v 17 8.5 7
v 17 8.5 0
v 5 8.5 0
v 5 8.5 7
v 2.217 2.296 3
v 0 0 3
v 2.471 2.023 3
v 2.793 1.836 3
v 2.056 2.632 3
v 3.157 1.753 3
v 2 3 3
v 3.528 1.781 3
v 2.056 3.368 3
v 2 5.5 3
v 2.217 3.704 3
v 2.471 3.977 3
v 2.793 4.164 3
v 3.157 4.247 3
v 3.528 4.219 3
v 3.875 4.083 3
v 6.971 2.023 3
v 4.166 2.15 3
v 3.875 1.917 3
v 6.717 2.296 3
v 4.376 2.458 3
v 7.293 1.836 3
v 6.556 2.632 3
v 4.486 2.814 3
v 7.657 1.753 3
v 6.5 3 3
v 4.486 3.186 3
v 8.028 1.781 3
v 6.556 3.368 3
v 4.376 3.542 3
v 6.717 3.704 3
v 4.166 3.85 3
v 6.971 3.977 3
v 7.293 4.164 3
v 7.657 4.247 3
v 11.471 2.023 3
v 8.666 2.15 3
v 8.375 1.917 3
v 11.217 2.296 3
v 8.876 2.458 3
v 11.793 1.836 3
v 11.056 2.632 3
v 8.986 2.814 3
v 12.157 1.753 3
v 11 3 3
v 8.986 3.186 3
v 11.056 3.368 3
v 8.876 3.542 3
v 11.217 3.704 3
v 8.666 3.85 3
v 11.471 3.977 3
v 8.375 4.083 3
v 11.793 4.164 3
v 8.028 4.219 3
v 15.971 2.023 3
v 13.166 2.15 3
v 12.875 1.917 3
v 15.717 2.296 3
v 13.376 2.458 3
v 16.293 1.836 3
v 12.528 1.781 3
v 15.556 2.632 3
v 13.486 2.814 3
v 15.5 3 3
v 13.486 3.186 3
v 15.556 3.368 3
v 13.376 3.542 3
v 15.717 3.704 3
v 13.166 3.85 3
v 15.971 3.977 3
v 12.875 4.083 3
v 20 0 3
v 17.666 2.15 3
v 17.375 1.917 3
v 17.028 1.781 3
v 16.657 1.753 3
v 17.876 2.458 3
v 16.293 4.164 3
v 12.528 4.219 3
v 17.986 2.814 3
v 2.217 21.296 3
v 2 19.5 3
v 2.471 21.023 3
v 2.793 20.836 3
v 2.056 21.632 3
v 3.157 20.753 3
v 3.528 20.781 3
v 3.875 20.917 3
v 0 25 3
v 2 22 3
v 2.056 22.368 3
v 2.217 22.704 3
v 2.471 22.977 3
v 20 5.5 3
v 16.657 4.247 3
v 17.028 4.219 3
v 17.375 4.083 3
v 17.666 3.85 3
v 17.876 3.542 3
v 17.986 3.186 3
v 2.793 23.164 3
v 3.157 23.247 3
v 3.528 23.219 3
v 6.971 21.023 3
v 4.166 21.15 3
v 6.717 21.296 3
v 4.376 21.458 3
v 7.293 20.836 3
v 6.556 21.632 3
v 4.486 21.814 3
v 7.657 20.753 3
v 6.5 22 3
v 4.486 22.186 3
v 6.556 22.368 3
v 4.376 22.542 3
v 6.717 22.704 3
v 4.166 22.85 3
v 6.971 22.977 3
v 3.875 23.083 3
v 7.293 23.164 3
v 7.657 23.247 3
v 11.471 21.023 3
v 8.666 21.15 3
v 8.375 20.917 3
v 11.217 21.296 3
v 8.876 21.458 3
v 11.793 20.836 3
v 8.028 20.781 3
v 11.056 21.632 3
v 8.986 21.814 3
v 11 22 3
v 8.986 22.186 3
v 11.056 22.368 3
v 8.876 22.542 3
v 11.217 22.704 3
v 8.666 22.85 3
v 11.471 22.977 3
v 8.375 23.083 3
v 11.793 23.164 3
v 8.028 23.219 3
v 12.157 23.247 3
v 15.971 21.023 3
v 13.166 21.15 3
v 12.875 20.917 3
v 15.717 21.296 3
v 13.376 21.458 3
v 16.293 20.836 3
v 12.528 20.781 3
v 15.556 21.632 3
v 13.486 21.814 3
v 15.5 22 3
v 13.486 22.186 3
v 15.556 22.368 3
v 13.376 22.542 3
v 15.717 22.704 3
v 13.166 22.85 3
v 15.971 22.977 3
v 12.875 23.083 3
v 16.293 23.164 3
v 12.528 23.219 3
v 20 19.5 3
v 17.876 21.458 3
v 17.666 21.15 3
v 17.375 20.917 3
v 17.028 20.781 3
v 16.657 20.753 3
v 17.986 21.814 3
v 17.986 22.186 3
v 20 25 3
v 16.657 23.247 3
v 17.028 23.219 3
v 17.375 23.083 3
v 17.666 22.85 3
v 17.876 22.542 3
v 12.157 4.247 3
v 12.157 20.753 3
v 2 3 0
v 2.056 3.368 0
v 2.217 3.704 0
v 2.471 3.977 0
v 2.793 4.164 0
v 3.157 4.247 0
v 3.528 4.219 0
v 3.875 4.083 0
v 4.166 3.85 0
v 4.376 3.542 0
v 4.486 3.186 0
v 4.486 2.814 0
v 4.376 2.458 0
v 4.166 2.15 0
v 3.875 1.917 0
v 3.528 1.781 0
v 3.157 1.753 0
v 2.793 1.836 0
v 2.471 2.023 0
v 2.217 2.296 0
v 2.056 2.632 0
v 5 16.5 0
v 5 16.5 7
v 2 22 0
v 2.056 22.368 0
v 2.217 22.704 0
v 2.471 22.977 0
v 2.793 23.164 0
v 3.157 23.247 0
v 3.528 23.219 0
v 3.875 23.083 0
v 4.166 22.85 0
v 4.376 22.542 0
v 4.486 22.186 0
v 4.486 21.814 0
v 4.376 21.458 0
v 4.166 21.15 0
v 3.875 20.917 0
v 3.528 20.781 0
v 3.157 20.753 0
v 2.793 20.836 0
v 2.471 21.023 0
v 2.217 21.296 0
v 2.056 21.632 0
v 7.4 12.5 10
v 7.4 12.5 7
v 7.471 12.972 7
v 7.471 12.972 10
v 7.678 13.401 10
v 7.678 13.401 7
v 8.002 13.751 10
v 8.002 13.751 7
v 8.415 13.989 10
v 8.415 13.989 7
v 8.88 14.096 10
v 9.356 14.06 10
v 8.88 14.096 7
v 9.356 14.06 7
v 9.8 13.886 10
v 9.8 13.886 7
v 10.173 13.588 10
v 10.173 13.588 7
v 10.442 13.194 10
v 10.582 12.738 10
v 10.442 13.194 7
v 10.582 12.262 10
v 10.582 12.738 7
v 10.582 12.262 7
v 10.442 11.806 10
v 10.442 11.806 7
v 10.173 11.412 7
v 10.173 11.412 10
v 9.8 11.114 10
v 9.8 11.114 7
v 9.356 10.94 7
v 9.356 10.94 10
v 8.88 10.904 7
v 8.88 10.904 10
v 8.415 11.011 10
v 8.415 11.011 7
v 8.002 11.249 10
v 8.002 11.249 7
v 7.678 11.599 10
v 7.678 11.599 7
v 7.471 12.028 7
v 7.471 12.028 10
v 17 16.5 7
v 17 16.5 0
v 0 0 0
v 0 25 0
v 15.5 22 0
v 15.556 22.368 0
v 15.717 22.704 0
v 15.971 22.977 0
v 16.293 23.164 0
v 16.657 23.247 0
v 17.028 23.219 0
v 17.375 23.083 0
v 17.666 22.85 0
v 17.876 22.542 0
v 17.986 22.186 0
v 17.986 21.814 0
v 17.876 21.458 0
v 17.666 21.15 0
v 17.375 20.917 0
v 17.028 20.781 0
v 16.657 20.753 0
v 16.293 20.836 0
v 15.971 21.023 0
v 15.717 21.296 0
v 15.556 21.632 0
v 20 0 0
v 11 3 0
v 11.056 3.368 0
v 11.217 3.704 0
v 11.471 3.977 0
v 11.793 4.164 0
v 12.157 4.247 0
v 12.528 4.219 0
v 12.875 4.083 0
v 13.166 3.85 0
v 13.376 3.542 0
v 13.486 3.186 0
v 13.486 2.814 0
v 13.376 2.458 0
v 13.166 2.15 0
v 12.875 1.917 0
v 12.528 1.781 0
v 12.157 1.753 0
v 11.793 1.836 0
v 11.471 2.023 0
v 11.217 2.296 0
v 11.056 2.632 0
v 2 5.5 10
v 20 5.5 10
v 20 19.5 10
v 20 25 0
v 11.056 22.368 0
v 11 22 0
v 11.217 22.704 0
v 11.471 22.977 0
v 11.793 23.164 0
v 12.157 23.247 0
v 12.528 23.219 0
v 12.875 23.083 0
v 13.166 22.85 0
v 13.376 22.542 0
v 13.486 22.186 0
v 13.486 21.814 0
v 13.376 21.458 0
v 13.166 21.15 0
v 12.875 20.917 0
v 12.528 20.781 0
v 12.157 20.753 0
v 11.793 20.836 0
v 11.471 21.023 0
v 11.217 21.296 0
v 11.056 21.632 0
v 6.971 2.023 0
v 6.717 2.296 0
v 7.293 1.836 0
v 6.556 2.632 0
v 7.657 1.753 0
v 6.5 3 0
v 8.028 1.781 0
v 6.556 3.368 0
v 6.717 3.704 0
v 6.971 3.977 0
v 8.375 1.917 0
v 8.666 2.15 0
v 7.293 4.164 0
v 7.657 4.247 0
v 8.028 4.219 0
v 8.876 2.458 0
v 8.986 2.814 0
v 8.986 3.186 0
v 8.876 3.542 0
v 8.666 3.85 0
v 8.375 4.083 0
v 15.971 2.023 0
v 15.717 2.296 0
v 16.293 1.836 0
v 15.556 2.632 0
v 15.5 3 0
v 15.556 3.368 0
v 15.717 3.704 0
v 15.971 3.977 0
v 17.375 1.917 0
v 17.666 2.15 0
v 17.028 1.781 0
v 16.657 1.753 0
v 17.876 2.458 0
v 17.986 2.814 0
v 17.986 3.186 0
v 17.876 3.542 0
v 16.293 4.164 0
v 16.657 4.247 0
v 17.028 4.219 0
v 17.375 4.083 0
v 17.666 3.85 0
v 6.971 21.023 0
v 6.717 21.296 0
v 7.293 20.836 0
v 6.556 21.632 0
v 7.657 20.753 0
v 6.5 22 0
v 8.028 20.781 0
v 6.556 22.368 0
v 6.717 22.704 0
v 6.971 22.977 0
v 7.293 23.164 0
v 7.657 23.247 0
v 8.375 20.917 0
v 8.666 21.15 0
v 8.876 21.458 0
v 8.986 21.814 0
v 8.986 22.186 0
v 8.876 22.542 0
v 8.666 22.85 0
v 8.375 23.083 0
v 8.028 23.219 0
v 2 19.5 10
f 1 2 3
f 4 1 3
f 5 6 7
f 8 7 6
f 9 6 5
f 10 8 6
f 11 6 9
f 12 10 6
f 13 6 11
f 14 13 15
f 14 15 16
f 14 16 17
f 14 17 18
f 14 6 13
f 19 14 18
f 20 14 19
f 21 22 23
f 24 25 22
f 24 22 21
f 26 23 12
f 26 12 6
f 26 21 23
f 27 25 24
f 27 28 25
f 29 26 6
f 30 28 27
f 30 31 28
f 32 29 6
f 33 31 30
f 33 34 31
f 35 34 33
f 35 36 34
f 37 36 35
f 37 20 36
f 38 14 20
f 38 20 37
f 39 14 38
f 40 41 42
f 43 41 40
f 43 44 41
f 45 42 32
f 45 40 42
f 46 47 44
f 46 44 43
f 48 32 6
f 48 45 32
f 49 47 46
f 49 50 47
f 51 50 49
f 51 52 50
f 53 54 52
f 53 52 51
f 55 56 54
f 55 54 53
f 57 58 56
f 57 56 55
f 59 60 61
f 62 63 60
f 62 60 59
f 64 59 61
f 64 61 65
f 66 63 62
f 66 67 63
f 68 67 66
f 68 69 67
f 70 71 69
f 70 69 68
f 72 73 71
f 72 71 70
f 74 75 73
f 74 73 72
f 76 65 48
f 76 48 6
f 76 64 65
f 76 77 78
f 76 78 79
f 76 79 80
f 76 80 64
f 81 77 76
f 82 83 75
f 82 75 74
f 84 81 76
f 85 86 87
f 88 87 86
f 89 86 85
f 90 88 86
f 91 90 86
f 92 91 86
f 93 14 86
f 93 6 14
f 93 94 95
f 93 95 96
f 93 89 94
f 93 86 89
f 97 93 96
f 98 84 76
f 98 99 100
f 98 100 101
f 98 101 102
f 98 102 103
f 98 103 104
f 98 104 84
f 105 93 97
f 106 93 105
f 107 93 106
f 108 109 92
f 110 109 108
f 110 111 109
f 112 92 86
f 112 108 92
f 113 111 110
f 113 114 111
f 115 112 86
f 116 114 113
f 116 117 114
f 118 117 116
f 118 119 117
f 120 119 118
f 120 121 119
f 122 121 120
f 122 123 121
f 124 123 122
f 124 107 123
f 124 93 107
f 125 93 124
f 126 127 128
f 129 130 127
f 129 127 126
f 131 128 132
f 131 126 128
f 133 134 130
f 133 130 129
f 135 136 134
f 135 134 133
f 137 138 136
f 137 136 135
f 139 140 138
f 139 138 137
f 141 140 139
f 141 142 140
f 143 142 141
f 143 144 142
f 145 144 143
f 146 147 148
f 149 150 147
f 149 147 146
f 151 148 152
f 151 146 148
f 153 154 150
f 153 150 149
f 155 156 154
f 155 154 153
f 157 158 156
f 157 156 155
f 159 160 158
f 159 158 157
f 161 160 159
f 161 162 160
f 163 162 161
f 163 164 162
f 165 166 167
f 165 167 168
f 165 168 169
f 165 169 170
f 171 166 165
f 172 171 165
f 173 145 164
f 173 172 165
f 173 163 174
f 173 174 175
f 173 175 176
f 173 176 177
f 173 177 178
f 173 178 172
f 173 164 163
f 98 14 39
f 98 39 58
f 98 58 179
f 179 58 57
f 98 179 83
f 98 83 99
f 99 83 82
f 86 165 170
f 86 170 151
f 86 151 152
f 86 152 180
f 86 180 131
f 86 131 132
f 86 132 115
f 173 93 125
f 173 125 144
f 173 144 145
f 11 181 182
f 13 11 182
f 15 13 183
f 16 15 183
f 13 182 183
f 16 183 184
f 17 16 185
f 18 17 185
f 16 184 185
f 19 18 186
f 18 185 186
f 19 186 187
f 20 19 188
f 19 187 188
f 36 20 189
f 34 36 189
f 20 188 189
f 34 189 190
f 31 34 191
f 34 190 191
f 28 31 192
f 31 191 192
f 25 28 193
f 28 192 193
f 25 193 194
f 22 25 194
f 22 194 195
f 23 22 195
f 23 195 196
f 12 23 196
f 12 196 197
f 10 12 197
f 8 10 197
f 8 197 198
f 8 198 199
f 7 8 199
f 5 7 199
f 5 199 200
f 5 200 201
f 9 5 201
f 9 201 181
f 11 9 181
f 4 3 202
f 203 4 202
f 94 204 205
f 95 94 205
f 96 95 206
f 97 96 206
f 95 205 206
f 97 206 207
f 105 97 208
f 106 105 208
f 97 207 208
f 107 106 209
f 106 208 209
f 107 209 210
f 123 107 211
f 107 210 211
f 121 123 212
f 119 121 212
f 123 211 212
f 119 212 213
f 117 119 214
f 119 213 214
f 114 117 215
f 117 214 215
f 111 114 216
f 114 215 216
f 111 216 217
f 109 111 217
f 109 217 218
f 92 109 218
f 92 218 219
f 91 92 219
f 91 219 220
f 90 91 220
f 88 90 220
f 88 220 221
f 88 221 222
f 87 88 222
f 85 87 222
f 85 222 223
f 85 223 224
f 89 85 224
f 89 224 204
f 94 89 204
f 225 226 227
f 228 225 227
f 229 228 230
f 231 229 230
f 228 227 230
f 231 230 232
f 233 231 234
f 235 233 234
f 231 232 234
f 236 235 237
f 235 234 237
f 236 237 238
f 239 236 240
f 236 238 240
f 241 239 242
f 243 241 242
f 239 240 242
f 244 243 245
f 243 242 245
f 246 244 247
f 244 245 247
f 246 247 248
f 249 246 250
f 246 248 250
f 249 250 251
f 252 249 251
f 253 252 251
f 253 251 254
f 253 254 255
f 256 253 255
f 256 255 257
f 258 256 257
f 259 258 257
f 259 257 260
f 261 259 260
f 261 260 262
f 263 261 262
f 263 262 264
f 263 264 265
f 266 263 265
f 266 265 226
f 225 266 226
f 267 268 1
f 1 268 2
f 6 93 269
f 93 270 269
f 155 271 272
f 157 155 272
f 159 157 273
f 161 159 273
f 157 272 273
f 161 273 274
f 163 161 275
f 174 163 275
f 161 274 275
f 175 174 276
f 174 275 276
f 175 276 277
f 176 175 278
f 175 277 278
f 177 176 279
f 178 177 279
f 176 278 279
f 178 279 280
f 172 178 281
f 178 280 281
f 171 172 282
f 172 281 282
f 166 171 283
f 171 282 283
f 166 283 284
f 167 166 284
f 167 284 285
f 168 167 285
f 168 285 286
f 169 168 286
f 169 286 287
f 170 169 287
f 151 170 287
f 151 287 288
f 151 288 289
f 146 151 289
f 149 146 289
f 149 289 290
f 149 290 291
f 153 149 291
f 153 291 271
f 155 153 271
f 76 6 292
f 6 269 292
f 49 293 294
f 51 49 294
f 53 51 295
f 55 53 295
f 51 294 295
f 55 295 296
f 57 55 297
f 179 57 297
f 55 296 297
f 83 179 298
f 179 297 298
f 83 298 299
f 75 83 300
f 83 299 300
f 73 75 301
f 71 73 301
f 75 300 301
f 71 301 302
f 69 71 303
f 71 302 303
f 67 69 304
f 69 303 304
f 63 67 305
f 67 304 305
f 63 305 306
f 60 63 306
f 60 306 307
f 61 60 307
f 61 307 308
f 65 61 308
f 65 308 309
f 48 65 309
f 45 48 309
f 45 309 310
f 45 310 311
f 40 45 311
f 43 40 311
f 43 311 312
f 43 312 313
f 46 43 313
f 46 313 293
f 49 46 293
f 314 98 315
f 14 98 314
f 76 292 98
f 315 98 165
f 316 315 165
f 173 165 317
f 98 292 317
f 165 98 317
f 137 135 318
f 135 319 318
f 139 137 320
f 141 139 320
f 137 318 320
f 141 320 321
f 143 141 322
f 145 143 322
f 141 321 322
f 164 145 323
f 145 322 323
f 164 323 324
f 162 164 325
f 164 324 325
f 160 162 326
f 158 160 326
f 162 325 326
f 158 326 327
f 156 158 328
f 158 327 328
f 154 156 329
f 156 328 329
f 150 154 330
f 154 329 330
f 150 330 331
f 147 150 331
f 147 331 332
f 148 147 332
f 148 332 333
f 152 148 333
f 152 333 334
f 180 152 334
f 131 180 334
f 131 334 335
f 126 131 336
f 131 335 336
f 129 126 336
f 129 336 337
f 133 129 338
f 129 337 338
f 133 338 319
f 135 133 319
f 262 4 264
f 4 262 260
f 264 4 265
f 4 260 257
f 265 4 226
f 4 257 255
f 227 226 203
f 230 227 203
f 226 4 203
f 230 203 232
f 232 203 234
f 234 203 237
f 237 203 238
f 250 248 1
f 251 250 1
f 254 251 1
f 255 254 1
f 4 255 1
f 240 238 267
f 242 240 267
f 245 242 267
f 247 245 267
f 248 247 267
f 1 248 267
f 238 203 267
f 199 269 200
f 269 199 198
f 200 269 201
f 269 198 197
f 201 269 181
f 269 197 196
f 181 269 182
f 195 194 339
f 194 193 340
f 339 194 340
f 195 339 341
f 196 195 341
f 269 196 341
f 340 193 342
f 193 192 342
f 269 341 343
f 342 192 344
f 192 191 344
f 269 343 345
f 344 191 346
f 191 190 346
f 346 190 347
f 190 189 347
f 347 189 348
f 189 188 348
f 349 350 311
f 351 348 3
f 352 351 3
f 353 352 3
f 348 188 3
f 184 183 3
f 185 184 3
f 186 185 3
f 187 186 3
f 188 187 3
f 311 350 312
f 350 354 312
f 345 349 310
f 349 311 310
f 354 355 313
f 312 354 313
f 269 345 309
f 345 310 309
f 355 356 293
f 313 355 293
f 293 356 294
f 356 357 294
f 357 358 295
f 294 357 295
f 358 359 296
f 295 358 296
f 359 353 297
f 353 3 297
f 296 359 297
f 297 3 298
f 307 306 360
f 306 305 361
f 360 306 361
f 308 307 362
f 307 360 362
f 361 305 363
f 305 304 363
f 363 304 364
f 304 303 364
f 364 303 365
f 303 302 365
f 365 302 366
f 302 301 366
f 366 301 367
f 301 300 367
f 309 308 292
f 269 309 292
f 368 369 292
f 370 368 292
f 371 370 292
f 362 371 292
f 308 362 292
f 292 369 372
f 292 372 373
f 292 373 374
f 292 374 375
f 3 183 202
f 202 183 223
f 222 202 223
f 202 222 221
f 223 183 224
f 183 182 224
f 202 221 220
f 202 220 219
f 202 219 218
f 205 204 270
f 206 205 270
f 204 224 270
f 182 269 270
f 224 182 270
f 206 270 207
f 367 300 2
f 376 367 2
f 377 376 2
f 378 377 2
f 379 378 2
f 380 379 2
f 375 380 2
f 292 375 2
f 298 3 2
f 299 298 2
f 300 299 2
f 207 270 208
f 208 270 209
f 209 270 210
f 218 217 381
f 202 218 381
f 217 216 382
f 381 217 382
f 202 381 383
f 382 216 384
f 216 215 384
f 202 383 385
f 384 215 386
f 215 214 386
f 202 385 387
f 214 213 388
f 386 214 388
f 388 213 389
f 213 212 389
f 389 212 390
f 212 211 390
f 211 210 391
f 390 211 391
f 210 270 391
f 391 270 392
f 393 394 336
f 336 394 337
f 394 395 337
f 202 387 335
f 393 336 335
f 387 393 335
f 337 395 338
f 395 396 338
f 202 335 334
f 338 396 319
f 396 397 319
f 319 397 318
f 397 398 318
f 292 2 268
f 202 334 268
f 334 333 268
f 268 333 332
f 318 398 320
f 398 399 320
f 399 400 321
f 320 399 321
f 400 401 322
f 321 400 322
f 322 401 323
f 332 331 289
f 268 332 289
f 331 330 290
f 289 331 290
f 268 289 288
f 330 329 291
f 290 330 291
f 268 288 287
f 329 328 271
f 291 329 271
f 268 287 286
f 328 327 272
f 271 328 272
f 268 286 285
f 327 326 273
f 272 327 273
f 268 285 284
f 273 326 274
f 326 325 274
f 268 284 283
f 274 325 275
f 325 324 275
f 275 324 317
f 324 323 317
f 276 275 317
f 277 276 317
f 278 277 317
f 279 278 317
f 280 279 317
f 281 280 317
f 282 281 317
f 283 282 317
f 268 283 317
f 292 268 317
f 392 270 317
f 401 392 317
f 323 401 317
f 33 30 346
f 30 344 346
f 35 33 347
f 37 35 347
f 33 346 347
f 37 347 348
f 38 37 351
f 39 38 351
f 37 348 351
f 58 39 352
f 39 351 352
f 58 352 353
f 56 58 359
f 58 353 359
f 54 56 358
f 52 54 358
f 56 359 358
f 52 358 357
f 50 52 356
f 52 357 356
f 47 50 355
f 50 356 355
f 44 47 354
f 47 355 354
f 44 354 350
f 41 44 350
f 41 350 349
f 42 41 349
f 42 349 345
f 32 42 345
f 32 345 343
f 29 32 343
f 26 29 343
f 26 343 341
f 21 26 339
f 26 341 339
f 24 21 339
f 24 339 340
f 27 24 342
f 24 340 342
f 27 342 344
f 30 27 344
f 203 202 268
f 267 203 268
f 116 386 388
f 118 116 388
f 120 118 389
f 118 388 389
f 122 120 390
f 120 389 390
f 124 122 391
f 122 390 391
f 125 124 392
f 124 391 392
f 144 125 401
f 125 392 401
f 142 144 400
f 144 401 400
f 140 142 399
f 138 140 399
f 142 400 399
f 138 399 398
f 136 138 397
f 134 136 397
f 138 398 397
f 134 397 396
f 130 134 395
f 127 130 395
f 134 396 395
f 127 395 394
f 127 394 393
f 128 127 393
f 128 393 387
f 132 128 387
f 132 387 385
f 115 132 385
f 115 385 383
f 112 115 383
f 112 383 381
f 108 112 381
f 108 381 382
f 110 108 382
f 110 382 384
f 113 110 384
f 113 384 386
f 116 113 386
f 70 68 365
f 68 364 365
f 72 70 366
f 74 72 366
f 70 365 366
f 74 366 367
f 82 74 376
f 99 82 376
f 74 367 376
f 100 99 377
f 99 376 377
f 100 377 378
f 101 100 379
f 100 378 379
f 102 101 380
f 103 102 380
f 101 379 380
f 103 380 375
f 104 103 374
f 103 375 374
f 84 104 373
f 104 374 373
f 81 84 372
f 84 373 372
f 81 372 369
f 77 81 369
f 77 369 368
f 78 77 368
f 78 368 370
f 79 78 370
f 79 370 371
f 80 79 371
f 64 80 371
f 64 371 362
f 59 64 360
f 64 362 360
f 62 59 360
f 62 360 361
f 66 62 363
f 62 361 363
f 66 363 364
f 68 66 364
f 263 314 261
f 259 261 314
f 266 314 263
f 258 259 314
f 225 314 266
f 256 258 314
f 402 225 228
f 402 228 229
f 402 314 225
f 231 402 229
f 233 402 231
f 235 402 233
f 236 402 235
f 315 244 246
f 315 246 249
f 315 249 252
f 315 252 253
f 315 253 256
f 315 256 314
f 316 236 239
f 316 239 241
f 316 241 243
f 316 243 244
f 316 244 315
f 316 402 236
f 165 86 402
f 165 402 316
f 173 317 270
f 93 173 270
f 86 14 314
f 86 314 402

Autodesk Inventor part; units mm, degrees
ref_plane "YZ Plane" through (0, 0, 0) normal (1, 0, 0) x (0, 1, 0)
ref_plane "XZ Plane" through (0, 0, 0) normal (0, 1, 0) x (-1, 0, 0)
ref_plane "XY Plane" through (0, 0, 0) normal (0, 0, 1) x (1, 0, 0)
sketch "Sketch1" plane through (0, 0, 0) normal (0, 0, 1) x (1, 0, 0)
  line L0 (0, 0) -> (20, 0)
  line L1 (20, 0) -> (20, 25)
  line L2 (20, 25) -> (0, 25)
  line L3 (0, 25) -> (0, 0)
  line L4 (5, 16.5) -> (17, 16.5)
  line L5 (17, 16.5) -> (17, 8.5)
  line L6 (17, 8.5) -> (5, 8.5)
  line L7 (5, 8.5) -> (5, 16.5)
  point P0 (17, 12.5)
  point P1 (20, 12.5)
  dimension "d0" = 20
  dimension "d2" = 25
  dimension "d3" = 8
  dimension "d4" = 12
  dimension "d5" = 3
extrude "Extrusion1" add sketch "Sketch1" along normal blind 3
sketch "Sketch2" plane through (0, 0, 3) normal (0, 0, 1) x (1, 0, 0)
  line L0 (17, 16.5) -> (17, 8.5) projected
  line L1 (17, 8.5) -> (5, 8.5) projected
  line L2 (5, 8.5) -> (5, 16.5) projected
  line L3 (5, 16.5) -> (17, 16.5) projected
  line L4 (20, 0) -> (20, 25) projected
  line L5 (20, 19.5) -> (20, 5.5)
  line L6 (20, 5.5) -> (2, 5.5)
  line L7 (2, 5.5) -> (2, 19.5)
  line L8 (2, 19.5) -> (20, 19.5)
extrude "Extrusion2" add sketch "Sketch2" along normal blind 7
sketch "Sketch3" plane through (0, 0, 10) normal (0, 0, 1) x (1, 0, 0)
  line L0 (17, 8.5) -> (5, 8.5) projected
  line L1 (5, 8.5) -> (5, 16.5) projected
  line L2 (5, 16.5) -> (17, 16.5) projected
  line L3 (17, 16.5) -> (17, 8.5) projected
  point P0 (0, 0)
extrude "Extrusion3" add sketch "Sketch3" against normal blind 3
sketch "Sketch4" plane through (0, 0, 0) normal (0, 0, -1) x (-1, 0, 0)
  line L0 (0, 0) -> (-20, 0) projected
  line L1 (-20, 25) -> (0, 25) projected
  line L2 (-20, 0) -> (-20, 25) projected
  circle A0 centre (-16.75, 22) radius 1.25
  circle A1 centre (-12.25, 22) radius 1.25
  circle A2 centre (-7.75, 22) radius 1.25
  circle A3 centre (-3.25, 22) radius 1.25
  circle A4 centre (-16.75, 3) radius 1.25
  circle A5 centre (-12.25, 3) radius 1.25
  circle A6 centre (-7.75, 3) radius 1.25
  circle A7 centre (-3.25, 3) radius 1.25
  line L3 (-12.25, 22) -> (-7.75, 22)
  line L4 (-17, 8.5) -> (-17, 16.5) projected
  line L5 (-17, 16.5) -> (-5, 16.5) projected
  circle A8 centre (-9, 12.5) radius 1.6
  line L6 (-5, 16.5) -> (-5, 8.5) projected
  point P0 (-10, 22)
  point P1 (-10, 25)
  point P2 (-17, 12.5)
  point P3 (-11, 16.5)
  dimension "d12" = 2.5
  dimension "d13" = 2.5
  dimension "d14" = 2.5
  dimension "d15" = 2.5
  dimension "d16" = 2.5
  dimension "d17" = 2.5
  dimension "d18" = 2.5
  dimension "d19" = 2.5
  dimension "d20" = 4.5
  dimension "d21" = 4.5
  dimension "d22" = 4.5
  dimension "d23" = 3
  dimension "d24" = 3
  dimension "d27" = 3.2
  dimension "d28" = 4
extrude "Extrusion4" cut sketch "Sketch4" against normal blind 10
equation "\"d21\" = d20"
equation "\"d22\" = d20"
equation "\"d24\" = d23"
properties part number "end limit holder"
